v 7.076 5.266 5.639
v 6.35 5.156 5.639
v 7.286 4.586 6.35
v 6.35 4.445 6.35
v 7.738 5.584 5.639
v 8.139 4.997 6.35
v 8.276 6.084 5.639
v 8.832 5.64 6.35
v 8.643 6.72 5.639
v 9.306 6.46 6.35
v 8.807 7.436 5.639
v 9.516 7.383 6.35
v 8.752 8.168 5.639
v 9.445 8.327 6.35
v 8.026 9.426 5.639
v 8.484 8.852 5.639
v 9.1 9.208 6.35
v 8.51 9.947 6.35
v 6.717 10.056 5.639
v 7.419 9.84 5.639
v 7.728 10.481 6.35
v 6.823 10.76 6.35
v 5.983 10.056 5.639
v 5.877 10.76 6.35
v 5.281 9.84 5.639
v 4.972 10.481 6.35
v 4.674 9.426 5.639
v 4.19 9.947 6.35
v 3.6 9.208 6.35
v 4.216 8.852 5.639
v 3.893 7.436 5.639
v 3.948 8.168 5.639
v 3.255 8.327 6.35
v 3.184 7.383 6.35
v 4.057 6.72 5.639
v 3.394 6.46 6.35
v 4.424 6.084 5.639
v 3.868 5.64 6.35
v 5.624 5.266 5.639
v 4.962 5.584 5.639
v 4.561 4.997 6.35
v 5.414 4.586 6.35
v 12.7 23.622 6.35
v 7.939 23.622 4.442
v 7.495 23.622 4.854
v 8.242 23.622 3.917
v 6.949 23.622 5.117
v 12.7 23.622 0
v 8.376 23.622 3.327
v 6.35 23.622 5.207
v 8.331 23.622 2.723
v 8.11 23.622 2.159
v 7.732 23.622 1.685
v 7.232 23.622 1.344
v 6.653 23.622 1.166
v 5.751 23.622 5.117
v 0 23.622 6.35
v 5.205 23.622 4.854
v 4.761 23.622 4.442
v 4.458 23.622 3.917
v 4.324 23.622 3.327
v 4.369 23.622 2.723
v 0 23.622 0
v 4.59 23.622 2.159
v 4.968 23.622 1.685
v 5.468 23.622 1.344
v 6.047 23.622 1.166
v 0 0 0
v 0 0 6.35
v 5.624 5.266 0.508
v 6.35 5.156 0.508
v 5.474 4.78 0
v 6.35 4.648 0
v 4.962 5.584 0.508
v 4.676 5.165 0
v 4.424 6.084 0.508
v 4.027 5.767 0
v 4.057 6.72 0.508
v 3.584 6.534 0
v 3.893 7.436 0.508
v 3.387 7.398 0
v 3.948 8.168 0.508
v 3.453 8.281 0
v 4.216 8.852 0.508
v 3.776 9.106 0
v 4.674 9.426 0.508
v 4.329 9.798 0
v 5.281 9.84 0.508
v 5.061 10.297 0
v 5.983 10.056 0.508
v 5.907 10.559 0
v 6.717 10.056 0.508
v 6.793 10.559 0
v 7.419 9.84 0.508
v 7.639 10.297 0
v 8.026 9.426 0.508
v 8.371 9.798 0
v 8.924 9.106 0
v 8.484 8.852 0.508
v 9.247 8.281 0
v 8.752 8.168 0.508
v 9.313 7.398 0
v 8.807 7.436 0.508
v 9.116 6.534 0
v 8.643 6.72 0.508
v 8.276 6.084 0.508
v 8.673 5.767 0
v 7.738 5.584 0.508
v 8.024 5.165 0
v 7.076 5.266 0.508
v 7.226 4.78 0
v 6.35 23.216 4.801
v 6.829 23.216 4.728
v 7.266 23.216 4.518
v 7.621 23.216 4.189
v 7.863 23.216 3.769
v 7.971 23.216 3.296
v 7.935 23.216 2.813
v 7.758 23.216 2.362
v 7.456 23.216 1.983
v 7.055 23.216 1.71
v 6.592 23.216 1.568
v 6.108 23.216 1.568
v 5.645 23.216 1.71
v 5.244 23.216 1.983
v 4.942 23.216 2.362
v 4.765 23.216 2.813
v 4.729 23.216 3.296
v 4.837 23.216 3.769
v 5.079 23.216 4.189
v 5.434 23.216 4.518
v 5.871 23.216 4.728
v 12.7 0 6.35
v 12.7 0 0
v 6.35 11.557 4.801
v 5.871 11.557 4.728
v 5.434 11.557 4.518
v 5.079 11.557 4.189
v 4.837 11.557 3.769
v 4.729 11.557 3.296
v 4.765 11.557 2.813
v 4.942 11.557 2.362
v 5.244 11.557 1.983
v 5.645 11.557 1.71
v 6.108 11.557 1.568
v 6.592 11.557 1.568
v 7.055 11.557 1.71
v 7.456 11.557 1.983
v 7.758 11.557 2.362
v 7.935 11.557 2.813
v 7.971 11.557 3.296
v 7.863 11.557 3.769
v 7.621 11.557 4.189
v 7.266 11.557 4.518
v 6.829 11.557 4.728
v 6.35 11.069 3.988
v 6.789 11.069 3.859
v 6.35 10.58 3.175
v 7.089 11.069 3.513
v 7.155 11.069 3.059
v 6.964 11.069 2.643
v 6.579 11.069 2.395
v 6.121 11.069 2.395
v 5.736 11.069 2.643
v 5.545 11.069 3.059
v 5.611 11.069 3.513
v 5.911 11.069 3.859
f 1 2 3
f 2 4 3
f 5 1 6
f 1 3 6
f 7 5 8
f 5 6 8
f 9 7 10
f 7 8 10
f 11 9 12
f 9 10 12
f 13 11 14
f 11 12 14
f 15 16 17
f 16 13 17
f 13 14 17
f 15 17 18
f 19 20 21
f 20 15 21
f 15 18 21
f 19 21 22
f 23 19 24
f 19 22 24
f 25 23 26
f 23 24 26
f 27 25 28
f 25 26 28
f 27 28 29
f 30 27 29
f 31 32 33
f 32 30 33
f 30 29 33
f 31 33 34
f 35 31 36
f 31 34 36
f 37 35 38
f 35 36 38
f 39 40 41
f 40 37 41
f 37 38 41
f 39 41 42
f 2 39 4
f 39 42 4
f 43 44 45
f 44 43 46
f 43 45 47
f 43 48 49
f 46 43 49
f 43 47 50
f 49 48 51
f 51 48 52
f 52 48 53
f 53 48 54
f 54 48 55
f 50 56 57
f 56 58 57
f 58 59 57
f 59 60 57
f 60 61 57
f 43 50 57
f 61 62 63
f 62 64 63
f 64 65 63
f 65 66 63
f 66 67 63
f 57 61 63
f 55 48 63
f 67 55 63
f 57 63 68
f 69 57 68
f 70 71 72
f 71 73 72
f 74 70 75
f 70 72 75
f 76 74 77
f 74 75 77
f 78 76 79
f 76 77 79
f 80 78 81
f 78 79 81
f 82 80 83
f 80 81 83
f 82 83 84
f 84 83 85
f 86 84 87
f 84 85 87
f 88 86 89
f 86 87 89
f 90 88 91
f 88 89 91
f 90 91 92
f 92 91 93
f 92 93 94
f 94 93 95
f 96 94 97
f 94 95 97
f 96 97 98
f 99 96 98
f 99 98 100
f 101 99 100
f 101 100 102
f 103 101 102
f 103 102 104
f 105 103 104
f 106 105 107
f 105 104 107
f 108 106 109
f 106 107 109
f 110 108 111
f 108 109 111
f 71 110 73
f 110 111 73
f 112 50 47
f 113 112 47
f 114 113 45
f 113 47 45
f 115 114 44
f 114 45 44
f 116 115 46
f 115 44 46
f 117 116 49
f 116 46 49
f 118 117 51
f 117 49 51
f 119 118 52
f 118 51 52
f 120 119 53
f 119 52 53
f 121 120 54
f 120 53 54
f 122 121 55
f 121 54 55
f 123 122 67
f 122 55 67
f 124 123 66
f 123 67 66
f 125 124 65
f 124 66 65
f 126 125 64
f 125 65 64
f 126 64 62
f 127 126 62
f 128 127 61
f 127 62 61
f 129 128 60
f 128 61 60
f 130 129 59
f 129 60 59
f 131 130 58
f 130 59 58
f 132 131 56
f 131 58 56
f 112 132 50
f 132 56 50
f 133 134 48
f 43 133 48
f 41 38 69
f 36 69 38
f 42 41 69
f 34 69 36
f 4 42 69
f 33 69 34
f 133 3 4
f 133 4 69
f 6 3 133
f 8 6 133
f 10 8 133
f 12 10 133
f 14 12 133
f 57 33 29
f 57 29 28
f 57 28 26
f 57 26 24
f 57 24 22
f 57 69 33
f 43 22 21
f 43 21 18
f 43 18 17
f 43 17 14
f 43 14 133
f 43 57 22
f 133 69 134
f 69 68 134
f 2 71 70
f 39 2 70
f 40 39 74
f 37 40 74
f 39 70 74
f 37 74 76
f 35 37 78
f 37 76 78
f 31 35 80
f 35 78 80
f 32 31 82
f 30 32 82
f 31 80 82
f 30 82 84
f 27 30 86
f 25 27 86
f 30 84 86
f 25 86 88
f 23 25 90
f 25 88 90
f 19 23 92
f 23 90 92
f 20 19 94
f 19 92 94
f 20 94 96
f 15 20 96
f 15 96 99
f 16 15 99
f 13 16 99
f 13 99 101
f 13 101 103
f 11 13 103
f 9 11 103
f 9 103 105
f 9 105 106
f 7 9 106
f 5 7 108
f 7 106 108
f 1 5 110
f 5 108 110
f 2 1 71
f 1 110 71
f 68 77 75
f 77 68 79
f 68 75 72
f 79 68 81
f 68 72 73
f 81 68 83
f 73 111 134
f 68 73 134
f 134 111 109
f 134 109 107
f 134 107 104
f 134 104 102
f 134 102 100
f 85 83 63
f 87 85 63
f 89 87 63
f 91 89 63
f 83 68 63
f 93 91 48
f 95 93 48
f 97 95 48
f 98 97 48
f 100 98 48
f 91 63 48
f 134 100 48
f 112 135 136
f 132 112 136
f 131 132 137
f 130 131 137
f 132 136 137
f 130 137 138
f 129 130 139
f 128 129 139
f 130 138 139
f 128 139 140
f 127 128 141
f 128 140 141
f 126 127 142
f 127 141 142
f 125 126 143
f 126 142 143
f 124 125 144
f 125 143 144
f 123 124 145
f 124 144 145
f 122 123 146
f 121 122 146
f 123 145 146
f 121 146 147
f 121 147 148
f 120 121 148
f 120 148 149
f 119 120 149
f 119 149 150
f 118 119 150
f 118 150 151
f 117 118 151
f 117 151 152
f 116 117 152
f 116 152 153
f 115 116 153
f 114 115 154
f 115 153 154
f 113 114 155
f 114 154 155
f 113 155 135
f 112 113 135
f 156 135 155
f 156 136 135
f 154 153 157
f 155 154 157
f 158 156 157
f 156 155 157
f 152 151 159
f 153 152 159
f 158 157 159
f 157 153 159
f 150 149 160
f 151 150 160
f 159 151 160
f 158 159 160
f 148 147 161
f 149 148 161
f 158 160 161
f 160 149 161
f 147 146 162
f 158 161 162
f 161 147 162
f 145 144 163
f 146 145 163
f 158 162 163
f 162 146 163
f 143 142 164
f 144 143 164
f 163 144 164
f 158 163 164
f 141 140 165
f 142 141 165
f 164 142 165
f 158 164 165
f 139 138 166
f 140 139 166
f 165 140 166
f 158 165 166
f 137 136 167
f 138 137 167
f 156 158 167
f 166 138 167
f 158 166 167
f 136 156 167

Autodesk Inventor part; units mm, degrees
ref_plane "YZ Plane" through (0, 0, 0) normal (1, 0, 0) x (0, 1, 0)
ref_plane "XZ Plane" through (0, 0, 0) normal (0, 1, 0) x (-1, 0, 0)
ref_plane "XY Plane" through (0, 0, 0) normal (0, 0, 1) x (1, 0, 0)
sketch "Sketch1" plane through (0, 0, 0) normal (0, 0, 1) x (1, 0, 0)
  line L0 (0, 0) -> (12.7, 0)
  line L1 (12.7, 0) -> (12.7, 23.622)
  line L2 (12.7, 23.622) -> (0, 23.622)
  line L3 (0, 23.622) -> (0, 0)
  dimension "d0" = 12.7
  dimension "d1" = 23.622
extrude "Extrusion1" add sketch "Sketch1" along normal blind 6.35
sketch "Sketch2" plane through (0, 0, 6.35) normal (0, 0, 1) x (1, 0, 0)
  line L0 (12.7, 0) -> (12.7, 23.622) projected
  line L1 (0, 0) -> (12.7, 0) projected
  point P0 (6.35, 7.62)
  dimension "d4" = 6.35
  dimension "d5" = 7.62
hole "6 MM Hole" at (6.35, 7.62, 6.35) direction (0, 0, -1) diameter 4.9276 end through all countersink diameter 6.35 countersink angle 90
sketch "Sketch3" plane through (0, 23.622, 0) normal (0, 1, 0) x (1, 0, 0)
  line L0 (12.7, 0) -> (0, 0) projected
  line L1 (0, 0) -> (0, -6.35) projected
  point P0 (6.35, -3.175)
  dimension "d13" = 3.175
  dimension "d14" = 6.35
hole "Hole2" at (6.35, 23.622, 3.175) direction (0, -1, 0) diameter 3.2512 depth 12.065 tip angle 118 countersink diameter 4.064 countersink angle 90
chamfer "Chamfer1" distance 0.508 angle 45 1 edges at (6.35, 10.0838, 0)
properties part number "Rear Leg"
